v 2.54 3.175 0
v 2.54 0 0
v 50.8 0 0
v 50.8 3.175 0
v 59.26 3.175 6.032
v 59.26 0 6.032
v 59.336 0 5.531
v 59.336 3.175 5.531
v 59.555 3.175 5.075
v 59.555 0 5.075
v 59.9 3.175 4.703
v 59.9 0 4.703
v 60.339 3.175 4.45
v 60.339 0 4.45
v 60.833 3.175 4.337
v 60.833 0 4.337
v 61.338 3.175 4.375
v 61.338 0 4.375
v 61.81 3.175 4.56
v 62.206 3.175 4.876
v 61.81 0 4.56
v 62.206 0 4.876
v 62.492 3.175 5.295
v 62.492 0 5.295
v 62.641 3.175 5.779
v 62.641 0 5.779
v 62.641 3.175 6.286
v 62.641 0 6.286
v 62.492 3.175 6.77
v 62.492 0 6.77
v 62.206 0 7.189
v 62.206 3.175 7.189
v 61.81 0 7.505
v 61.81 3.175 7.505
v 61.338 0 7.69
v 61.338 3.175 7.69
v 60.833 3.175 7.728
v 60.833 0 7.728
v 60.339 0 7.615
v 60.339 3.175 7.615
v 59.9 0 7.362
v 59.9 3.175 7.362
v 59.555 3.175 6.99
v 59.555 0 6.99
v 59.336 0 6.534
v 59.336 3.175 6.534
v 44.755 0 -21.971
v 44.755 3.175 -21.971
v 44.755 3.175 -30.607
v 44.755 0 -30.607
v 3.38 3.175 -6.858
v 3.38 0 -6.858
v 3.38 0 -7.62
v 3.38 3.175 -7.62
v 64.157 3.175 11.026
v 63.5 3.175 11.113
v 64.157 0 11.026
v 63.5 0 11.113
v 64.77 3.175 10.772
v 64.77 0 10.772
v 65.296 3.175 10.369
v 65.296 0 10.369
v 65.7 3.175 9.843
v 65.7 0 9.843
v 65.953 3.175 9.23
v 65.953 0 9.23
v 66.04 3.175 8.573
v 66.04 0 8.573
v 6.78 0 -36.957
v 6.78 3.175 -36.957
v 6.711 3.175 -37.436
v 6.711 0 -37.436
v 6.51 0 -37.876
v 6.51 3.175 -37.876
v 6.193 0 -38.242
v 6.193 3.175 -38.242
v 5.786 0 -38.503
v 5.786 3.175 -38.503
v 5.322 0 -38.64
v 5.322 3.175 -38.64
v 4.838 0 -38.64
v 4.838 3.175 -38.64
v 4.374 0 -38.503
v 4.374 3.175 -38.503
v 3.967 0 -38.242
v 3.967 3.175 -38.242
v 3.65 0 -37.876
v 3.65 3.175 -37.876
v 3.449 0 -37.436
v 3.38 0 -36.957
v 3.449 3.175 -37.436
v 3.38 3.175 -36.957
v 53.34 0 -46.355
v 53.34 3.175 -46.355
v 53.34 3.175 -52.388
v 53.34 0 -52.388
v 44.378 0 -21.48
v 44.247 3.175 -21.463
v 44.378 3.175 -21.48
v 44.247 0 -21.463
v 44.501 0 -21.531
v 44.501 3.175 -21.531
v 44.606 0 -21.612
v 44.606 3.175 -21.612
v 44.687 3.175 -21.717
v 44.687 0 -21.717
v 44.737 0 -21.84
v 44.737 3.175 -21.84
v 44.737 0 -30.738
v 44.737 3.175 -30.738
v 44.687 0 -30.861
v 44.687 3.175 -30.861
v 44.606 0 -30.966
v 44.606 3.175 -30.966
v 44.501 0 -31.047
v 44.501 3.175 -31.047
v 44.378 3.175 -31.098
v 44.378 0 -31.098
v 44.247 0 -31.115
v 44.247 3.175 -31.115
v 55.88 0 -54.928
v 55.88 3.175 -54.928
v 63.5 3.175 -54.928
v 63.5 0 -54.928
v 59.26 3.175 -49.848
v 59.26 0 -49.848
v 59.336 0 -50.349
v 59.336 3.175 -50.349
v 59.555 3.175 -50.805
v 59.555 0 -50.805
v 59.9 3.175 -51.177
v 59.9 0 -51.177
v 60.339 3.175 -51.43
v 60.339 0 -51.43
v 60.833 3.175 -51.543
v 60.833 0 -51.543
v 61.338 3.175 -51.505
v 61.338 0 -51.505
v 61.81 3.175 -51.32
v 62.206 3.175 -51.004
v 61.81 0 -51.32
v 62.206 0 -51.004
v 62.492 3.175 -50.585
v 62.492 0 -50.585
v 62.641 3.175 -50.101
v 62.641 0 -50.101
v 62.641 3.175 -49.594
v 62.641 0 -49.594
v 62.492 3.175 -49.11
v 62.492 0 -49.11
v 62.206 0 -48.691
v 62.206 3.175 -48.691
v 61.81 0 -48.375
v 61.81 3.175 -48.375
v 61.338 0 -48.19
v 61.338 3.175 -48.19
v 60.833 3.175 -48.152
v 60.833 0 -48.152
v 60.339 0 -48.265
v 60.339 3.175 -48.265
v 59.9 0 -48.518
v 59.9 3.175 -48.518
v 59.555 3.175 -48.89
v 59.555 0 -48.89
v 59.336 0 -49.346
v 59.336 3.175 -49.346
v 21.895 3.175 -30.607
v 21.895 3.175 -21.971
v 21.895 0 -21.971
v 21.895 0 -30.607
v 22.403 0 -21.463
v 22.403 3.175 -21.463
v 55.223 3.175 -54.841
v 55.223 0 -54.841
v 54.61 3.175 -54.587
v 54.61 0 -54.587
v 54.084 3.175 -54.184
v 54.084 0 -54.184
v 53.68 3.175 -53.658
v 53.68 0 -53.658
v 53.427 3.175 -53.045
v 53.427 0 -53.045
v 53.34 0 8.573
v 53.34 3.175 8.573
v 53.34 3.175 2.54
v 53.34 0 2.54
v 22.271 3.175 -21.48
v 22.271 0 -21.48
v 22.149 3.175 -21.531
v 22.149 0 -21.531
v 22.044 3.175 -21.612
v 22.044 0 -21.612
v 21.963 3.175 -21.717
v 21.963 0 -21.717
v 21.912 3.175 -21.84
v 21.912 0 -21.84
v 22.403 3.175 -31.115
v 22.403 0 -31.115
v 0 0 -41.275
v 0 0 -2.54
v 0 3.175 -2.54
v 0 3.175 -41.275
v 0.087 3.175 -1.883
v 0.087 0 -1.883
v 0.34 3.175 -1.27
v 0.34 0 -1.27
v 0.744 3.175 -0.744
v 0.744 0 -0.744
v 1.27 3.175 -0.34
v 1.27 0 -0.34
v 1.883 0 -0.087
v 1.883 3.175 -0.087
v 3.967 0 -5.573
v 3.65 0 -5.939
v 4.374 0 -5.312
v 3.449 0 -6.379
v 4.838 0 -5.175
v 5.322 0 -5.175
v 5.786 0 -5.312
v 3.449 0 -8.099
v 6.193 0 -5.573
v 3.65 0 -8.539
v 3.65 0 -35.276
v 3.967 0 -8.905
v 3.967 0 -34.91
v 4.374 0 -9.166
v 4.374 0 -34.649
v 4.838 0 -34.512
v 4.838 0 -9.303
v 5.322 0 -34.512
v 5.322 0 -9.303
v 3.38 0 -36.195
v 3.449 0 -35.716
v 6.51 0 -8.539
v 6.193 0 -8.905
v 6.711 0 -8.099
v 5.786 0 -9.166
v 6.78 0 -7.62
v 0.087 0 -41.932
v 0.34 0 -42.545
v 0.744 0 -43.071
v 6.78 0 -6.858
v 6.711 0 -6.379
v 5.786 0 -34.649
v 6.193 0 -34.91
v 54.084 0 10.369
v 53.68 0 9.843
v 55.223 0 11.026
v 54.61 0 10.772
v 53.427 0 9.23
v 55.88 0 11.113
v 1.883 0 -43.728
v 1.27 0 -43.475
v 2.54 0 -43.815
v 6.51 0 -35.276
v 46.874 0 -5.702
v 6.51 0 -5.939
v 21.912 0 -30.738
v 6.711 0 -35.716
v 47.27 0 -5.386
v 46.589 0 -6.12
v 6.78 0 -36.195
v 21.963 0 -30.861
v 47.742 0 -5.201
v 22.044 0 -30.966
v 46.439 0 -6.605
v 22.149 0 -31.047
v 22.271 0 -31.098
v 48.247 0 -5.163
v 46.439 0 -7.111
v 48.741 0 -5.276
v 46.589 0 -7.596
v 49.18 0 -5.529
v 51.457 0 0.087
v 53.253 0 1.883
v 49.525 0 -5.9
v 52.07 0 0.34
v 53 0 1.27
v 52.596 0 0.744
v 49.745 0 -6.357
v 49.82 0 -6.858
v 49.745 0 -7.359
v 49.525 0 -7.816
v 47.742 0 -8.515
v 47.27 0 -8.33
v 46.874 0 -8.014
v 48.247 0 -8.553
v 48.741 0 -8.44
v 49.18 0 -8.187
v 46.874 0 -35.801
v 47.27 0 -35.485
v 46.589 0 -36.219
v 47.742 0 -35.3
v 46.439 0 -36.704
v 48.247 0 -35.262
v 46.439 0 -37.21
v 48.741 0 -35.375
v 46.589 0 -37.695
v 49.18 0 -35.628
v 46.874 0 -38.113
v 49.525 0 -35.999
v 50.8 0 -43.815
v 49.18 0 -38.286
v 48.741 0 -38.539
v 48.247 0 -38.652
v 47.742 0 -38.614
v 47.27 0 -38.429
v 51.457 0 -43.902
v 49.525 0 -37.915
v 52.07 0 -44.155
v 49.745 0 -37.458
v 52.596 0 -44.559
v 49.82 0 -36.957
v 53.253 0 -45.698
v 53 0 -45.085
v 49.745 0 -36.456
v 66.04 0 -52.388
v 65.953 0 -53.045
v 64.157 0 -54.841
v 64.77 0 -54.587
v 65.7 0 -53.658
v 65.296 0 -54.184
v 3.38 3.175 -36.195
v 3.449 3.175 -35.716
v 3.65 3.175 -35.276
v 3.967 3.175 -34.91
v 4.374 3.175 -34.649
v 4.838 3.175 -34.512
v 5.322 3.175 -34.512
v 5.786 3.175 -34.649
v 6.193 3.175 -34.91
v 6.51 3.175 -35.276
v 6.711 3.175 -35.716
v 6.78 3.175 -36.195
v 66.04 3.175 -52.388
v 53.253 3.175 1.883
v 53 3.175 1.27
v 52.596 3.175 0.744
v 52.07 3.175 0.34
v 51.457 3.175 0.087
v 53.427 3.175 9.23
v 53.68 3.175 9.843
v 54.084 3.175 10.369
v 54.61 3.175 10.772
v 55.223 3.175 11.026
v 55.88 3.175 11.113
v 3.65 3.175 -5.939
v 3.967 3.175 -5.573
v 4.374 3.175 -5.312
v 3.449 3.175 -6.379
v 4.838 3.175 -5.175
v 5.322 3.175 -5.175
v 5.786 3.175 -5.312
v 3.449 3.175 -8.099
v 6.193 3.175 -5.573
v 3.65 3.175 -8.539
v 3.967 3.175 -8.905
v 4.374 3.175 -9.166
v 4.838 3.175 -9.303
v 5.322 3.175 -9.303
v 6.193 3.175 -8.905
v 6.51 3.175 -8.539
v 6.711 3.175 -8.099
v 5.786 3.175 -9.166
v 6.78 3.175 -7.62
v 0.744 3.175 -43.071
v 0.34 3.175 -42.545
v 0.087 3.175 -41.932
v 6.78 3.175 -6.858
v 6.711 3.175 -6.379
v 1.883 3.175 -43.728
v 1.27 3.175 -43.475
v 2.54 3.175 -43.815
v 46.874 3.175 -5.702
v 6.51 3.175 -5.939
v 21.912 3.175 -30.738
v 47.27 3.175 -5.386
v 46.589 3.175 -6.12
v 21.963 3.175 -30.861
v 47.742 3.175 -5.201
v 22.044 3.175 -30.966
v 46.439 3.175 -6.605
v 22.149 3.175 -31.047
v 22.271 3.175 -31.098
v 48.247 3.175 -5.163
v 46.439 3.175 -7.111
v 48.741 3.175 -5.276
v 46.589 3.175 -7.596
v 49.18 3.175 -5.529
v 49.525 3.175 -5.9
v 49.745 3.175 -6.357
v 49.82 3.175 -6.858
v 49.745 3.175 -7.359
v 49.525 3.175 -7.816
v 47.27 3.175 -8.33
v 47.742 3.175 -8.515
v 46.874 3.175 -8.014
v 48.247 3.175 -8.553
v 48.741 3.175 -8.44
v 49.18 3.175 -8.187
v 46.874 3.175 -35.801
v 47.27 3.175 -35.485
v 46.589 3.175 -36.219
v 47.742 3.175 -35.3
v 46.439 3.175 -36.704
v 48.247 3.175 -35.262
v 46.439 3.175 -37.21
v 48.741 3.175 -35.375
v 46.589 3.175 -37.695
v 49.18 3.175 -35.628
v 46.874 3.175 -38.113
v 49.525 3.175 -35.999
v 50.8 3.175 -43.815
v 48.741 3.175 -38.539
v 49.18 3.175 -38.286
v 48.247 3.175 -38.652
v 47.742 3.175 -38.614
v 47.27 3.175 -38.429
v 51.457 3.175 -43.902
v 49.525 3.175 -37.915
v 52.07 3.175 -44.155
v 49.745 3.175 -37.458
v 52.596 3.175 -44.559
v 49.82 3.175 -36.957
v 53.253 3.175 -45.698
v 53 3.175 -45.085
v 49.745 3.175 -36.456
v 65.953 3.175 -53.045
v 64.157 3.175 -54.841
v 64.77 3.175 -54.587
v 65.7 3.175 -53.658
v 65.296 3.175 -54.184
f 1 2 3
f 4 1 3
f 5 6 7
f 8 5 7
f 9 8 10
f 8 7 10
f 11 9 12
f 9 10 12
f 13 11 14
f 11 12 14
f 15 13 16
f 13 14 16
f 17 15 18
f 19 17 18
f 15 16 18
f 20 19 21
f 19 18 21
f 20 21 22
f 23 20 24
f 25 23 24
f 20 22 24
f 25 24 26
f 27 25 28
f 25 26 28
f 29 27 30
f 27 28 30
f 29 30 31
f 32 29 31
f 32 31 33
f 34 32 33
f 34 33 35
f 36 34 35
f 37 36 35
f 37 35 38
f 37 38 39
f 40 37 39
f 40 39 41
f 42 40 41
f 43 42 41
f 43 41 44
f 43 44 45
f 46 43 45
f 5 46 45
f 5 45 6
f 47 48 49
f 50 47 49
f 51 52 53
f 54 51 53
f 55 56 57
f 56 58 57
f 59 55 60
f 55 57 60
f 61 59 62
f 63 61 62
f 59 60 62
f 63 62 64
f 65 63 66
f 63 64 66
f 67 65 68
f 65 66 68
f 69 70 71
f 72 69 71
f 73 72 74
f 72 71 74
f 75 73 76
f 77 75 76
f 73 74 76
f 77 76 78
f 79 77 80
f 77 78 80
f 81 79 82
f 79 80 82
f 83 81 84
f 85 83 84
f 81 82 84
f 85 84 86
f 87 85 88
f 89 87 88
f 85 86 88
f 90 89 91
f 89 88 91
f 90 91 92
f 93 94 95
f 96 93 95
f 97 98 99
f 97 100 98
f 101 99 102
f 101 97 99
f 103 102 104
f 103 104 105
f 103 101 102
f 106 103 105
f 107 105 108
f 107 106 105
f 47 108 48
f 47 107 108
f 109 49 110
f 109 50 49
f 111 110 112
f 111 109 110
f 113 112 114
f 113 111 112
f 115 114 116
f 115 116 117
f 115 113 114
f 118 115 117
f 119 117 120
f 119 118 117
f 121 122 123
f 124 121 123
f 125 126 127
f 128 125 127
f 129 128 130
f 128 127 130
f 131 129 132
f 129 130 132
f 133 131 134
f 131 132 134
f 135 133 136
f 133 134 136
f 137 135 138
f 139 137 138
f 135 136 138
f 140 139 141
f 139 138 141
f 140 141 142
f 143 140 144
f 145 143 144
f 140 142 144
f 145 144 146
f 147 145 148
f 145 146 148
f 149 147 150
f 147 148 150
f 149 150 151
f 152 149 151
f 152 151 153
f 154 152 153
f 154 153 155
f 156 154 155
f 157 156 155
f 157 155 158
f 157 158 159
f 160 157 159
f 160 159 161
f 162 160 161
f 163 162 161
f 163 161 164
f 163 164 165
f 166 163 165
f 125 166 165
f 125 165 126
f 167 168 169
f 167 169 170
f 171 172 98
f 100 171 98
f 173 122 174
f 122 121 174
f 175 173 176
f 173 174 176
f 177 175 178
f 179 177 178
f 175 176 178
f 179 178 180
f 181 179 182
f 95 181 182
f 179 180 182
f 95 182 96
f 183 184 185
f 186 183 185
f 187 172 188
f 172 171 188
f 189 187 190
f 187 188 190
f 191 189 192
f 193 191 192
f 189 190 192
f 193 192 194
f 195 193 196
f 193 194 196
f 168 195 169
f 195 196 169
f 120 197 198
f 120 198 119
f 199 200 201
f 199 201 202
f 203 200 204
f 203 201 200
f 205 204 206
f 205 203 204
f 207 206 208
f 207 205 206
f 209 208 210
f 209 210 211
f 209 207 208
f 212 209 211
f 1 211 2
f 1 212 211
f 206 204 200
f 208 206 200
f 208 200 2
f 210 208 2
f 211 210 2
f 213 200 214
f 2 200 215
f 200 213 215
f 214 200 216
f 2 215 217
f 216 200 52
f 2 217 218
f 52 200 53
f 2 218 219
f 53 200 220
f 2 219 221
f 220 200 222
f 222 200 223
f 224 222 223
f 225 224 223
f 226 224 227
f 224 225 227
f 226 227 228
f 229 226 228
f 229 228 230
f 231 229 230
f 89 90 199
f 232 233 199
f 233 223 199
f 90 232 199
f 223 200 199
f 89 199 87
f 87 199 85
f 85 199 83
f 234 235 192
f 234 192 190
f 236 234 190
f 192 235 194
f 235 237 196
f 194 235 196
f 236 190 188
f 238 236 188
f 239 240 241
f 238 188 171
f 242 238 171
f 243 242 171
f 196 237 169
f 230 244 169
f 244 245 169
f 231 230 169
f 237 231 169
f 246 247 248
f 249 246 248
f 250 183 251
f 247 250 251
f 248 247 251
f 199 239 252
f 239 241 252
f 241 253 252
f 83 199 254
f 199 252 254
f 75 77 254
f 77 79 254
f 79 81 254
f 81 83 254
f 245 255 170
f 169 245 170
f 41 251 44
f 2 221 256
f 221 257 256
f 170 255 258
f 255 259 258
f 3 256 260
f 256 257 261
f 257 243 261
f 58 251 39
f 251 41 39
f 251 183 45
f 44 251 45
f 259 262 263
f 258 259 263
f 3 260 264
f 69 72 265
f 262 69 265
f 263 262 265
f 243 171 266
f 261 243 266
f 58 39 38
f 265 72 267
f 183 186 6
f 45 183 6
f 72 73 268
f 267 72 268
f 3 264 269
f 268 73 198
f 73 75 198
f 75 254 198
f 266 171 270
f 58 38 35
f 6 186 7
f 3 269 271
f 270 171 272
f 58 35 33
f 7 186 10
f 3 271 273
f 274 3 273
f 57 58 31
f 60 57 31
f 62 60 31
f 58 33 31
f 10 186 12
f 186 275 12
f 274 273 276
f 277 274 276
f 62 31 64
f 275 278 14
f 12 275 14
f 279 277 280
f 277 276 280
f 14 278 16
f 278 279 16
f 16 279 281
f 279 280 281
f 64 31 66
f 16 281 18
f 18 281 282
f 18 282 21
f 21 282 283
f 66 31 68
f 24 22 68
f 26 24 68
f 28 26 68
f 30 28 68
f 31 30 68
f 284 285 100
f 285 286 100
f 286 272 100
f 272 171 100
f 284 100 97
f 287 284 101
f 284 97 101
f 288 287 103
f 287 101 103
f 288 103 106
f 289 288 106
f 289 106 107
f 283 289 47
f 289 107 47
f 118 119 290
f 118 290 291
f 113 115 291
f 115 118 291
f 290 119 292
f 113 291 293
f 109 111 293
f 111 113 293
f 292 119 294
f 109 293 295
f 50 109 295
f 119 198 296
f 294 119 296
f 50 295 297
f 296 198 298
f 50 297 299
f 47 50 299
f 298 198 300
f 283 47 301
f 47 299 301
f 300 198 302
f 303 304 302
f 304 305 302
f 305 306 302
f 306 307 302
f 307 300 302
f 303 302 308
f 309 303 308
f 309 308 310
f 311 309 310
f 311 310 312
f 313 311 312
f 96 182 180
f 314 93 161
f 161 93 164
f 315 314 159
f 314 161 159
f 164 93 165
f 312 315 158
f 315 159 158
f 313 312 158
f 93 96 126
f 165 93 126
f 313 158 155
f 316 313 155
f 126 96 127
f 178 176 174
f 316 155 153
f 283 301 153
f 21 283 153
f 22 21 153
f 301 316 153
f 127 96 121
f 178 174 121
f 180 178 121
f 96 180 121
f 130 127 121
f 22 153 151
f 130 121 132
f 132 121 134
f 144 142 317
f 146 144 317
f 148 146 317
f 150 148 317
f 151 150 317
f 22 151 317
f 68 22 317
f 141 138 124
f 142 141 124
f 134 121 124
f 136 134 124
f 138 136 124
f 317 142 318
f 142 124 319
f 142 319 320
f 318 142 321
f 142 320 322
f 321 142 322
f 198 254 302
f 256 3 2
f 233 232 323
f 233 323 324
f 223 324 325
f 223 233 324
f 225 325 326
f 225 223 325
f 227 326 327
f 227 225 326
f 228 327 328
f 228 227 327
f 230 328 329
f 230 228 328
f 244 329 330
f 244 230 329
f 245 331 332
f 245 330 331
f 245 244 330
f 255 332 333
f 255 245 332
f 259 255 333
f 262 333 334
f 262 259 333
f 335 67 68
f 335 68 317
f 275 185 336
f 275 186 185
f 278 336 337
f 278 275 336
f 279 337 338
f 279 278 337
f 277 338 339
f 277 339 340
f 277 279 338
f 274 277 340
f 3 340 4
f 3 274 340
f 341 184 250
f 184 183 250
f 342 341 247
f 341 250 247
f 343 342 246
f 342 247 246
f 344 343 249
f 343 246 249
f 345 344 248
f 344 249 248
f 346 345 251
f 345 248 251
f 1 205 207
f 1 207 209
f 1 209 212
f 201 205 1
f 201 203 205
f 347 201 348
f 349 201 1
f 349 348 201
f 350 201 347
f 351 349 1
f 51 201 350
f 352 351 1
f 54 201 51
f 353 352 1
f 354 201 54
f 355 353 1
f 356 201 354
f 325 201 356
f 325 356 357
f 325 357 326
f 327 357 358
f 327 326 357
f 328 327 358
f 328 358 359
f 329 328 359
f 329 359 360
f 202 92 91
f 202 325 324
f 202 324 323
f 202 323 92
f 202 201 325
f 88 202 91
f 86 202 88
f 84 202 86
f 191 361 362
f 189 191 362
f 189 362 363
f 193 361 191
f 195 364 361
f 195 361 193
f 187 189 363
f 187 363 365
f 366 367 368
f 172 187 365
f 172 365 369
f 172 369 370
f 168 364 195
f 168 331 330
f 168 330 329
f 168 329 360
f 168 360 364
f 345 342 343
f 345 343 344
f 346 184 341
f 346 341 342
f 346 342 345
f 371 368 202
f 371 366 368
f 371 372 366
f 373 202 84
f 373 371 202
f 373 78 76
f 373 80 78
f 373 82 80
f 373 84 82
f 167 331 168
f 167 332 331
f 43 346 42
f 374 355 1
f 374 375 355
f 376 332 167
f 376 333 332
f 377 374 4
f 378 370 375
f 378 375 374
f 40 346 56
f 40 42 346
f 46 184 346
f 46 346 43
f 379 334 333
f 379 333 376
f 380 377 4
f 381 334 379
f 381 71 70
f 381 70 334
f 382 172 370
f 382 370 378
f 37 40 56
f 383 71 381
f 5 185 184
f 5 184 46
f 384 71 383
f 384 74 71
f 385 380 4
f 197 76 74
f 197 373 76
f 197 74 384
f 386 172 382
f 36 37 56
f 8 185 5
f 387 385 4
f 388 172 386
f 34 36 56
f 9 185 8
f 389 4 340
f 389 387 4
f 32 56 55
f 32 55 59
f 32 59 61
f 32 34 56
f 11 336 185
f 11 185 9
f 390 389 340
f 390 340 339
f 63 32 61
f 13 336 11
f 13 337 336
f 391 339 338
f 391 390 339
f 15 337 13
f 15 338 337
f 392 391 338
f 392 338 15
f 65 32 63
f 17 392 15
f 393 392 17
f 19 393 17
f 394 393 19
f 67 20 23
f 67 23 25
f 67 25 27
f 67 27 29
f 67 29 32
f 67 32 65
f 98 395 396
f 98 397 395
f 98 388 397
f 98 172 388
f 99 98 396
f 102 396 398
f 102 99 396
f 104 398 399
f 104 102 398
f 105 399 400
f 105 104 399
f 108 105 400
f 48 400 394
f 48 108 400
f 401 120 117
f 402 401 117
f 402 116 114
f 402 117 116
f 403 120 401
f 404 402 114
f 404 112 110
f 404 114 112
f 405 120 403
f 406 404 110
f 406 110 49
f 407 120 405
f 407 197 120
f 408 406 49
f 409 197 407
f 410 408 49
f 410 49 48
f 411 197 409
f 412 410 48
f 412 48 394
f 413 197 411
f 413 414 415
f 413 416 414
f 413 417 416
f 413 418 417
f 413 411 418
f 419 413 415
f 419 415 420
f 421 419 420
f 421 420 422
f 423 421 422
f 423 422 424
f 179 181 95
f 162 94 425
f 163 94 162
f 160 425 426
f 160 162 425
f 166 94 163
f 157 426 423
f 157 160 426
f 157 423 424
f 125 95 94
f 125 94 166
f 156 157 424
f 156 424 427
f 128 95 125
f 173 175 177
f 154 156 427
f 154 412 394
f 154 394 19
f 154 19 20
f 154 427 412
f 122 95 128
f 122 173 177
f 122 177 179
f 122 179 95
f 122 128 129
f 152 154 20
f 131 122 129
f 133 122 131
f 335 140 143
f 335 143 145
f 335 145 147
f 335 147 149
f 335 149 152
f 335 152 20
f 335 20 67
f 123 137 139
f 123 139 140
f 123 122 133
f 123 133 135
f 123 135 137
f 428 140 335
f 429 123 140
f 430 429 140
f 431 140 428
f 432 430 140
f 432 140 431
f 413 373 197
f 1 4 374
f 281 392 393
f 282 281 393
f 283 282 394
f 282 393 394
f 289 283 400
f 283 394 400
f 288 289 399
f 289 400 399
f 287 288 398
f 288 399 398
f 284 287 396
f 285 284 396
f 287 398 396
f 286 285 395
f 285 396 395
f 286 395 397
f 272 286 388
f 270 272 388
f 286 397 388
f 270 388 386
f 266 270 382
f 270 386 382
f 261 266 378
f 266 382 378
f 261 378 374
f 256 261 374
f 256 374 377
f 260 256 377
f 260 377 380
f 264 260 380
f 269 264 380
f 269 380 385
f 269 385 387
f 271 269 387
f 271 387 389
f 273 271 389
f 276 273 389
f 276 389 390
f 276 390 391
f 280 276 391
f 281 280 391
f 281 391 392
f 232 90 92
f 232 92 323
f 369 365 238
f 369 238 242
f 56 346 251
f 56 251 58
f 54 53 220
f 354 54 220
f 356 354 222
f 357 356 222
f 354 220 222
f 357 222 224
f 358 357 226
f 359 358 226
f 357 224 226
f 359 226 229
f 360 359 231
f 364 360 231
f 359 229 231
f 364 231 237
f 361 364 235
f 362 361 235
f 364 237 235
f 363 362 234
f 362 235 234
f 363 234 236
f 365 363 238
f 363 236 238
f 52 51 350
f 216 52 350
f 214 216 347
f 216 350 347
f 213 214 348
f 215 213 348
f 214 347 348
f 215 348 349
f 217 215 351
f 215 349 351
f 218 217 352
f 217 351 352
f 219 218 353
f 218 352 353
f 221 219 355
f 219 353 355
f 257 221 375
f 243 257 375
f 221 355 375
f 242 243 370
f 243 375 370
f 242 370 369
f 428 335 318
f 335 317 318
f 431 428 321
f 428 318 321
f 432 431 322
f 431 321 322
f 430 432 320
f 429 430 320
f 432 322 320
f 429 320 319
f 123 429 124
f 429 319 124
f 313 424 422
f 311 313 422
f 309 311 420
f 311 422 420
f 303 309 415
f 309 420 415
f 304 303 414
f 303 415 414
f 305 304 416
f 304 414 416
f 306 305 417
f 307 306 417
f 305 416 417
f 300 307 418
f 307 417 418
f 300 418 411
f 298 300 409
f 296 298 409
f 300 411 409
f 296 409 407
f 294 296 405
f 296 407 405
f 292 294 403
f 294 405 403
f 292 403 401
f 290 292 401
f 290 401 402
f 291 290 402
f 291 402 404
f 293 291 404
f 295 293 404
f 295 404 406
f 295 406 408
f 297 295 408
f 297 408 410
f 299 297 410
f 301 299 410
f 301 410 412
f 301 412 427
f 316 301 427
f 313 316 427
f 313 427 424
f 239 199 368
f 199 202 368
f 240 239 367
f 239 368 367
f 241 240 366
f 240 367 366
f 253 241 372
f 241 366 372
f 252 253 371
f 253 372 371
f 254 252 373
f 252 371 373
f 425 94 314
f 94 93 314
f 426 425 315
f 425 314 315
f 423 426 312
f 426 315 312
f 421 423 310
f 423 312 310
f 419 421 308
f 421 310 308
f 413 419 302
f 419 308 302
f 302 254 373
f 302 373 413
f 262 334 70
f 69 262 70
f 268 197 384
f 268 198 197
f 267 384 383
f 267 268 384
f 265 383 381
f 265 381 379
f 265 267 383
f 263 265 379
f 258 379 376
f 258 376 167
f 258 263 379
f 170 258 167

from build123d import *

# Parameters (mm, degrees)
SKETCH1_W            = 66.04
SKETCH1_H            = 43.815
BOSS_EXTRUDE1_DEPTH  = 3.175
M3_CLEARANCE_HOLE1_D = 3.4
SKETCH6_W            = 22.86
SKETCH6_H            = 9.652
CUT_EXTRUDE1_DEPTH   = 4.175
FILLET1_R            = 0.508
FILLET2_R            = 2.54
SKETCH7_W            = 12.7
SKETCH7_H            = 66.04
BOSS_EXTRUDE2_DEPTH  = 3.175
M3_CLEARANCE_HOLE2_D = 3.4
FILLET3_R            = 2.54
CUT_EXTRUDE2_DEPTH   = 4.175


with BuildPart() as part:
    # Sketch1 → Boss-Extrude1 (new body)
    with BuildSketch(Plane(origin=(0, 0, 0), x_dir=(1, 0, 0), z_dir=(0, 1, 0))):
        with Locations((33.02, 21.9075)):
            Rectangle(SKETCH1_W, SKETCH1_H)
    extrude(amount=BOSS_EXTRUDE1_DEPTH)

    # M3 Clearance Hole1 (through all)
    with Locations(Plane(origin=(0, 0, 0), x_dir=(-1, 0, 0), z_dir=(0, -1, 0))):
        with Locations((-5.08, 6.858), (-5.08, 36.957), (-48.1203, 36.957), (-48.1203, 6.858), (-60.96, 6.858), (-60.96, 36.957)):
            Hole(M3_CLEARANCE_HOLE1_D / 2)

    # Sketch6 → Cut-Extrude1 (cut, through all)
    with BuildSketch(Plane(origin=(0, 3.175, 0), x_dir=(1, 0, 0), z_dir=(0, 1, 0))):
        with Locations((33.3248, 26.289)):
            Rectangle(SKETCH6_W, SKETCH6_H)
    extrude(amount=-CUT_EXTRUDE1_DEPTH, mode=Mode.SUBTRACT)

    # Fillet1
    fillet1_edges = [part.edges().sort_by_distance(p)[0] for p in [
        (44.7548, 1.5875, -21.463),
        (21.8948, 1.5875, -21.463),
        (21.8948, 1.5875, -31.115),
        (44.7548, 1.5875, -31.115),
    ]]
    fillet(fillet1_edges, radius=FILLET1_R)

    # Fillet2
    fillet2_edges = [part.edges().sort_by_distance(p)[0] for p in [
        (0, 1.5875, -43.815),
        (66.04, 1.5875, -43.815),
        (66.04, 1.5875, 0),
        (0, 1.5875, 0),
    ]]
    fillet(fillet2_edges, radius=FILLET2_R)

    # Sketch7 → Boss-Extrude2 (add)
    with BuildSketch(Plane(origin=(0, 3.175, 0), x_dir=(1, 0, 0), z_dir=(0, 1, 0))):
        with Locations((59.69, 21.9075)):
            Rectangle(SKETCH7_W, SKETCH7_H)
    extrude(amount=-BOSS_EXTRUDE2_DEPTH)

    # M3 Clearance Hole2 (through all)
    with Locations(Plane(origin=(0, 3.175, 0), x_dir=(1, 0, 0), z_dir=(0, 1, 0))):
        with Locations((60.96, 49.8475), (60.96, -6.0325)):
            Hole(M3_CLEARANCE_HOLE2_D / 2)

    # Fillet3
    fillet3_edges = [part.edges().sort_by_distance(p)[0] for p in [
        (53.34, 1.5875, 11.1125),
        (66.04, 1.5875, -54.9275),
        (53.34, 1.5875, -54.9275),
        (53.34, 1.5875, 0),
        (53.34, 1.5875, -43.815),
        (66.04, 1.5875, 11.1125),
    ]]
    fillet(fillet3_edges, radius=FILLET3_R)

    # Sketch11 → Cut-Extrude2 (cut, through all)
    with BuildSketch(Plane.XZ):
        with BuildLine():
            Line((3.38, -6.858), (3.38, -7.62))
            ThreePointArc((3.38, -7.62), (5.08, -9.32), (6.78, -7.62))
            Line((6.78, -7.62), (6.78, -6.858))
            ThreePointArc((6.78, -6.858), (5.08, -5.158), (3.38, -6.858))
        make_face()
        with BuildLine():
            Line((6.78, -36.195), (6.78, -36.957))
            ThreePointArc((6.78, -36.957), (5.08, -38.657), (3.38, -36.957))
            Line((3.38, -36.957), (3.38, -36.195))
            ThreePointArc((3.38, -36.195), (5.08, -34.495), (6.78, -36.195))
        make_face()
    extrude(amount=-CUT_EXTRUDE2_DEPTH, mode=Mode.SUBTRACT)


solid = part.part
